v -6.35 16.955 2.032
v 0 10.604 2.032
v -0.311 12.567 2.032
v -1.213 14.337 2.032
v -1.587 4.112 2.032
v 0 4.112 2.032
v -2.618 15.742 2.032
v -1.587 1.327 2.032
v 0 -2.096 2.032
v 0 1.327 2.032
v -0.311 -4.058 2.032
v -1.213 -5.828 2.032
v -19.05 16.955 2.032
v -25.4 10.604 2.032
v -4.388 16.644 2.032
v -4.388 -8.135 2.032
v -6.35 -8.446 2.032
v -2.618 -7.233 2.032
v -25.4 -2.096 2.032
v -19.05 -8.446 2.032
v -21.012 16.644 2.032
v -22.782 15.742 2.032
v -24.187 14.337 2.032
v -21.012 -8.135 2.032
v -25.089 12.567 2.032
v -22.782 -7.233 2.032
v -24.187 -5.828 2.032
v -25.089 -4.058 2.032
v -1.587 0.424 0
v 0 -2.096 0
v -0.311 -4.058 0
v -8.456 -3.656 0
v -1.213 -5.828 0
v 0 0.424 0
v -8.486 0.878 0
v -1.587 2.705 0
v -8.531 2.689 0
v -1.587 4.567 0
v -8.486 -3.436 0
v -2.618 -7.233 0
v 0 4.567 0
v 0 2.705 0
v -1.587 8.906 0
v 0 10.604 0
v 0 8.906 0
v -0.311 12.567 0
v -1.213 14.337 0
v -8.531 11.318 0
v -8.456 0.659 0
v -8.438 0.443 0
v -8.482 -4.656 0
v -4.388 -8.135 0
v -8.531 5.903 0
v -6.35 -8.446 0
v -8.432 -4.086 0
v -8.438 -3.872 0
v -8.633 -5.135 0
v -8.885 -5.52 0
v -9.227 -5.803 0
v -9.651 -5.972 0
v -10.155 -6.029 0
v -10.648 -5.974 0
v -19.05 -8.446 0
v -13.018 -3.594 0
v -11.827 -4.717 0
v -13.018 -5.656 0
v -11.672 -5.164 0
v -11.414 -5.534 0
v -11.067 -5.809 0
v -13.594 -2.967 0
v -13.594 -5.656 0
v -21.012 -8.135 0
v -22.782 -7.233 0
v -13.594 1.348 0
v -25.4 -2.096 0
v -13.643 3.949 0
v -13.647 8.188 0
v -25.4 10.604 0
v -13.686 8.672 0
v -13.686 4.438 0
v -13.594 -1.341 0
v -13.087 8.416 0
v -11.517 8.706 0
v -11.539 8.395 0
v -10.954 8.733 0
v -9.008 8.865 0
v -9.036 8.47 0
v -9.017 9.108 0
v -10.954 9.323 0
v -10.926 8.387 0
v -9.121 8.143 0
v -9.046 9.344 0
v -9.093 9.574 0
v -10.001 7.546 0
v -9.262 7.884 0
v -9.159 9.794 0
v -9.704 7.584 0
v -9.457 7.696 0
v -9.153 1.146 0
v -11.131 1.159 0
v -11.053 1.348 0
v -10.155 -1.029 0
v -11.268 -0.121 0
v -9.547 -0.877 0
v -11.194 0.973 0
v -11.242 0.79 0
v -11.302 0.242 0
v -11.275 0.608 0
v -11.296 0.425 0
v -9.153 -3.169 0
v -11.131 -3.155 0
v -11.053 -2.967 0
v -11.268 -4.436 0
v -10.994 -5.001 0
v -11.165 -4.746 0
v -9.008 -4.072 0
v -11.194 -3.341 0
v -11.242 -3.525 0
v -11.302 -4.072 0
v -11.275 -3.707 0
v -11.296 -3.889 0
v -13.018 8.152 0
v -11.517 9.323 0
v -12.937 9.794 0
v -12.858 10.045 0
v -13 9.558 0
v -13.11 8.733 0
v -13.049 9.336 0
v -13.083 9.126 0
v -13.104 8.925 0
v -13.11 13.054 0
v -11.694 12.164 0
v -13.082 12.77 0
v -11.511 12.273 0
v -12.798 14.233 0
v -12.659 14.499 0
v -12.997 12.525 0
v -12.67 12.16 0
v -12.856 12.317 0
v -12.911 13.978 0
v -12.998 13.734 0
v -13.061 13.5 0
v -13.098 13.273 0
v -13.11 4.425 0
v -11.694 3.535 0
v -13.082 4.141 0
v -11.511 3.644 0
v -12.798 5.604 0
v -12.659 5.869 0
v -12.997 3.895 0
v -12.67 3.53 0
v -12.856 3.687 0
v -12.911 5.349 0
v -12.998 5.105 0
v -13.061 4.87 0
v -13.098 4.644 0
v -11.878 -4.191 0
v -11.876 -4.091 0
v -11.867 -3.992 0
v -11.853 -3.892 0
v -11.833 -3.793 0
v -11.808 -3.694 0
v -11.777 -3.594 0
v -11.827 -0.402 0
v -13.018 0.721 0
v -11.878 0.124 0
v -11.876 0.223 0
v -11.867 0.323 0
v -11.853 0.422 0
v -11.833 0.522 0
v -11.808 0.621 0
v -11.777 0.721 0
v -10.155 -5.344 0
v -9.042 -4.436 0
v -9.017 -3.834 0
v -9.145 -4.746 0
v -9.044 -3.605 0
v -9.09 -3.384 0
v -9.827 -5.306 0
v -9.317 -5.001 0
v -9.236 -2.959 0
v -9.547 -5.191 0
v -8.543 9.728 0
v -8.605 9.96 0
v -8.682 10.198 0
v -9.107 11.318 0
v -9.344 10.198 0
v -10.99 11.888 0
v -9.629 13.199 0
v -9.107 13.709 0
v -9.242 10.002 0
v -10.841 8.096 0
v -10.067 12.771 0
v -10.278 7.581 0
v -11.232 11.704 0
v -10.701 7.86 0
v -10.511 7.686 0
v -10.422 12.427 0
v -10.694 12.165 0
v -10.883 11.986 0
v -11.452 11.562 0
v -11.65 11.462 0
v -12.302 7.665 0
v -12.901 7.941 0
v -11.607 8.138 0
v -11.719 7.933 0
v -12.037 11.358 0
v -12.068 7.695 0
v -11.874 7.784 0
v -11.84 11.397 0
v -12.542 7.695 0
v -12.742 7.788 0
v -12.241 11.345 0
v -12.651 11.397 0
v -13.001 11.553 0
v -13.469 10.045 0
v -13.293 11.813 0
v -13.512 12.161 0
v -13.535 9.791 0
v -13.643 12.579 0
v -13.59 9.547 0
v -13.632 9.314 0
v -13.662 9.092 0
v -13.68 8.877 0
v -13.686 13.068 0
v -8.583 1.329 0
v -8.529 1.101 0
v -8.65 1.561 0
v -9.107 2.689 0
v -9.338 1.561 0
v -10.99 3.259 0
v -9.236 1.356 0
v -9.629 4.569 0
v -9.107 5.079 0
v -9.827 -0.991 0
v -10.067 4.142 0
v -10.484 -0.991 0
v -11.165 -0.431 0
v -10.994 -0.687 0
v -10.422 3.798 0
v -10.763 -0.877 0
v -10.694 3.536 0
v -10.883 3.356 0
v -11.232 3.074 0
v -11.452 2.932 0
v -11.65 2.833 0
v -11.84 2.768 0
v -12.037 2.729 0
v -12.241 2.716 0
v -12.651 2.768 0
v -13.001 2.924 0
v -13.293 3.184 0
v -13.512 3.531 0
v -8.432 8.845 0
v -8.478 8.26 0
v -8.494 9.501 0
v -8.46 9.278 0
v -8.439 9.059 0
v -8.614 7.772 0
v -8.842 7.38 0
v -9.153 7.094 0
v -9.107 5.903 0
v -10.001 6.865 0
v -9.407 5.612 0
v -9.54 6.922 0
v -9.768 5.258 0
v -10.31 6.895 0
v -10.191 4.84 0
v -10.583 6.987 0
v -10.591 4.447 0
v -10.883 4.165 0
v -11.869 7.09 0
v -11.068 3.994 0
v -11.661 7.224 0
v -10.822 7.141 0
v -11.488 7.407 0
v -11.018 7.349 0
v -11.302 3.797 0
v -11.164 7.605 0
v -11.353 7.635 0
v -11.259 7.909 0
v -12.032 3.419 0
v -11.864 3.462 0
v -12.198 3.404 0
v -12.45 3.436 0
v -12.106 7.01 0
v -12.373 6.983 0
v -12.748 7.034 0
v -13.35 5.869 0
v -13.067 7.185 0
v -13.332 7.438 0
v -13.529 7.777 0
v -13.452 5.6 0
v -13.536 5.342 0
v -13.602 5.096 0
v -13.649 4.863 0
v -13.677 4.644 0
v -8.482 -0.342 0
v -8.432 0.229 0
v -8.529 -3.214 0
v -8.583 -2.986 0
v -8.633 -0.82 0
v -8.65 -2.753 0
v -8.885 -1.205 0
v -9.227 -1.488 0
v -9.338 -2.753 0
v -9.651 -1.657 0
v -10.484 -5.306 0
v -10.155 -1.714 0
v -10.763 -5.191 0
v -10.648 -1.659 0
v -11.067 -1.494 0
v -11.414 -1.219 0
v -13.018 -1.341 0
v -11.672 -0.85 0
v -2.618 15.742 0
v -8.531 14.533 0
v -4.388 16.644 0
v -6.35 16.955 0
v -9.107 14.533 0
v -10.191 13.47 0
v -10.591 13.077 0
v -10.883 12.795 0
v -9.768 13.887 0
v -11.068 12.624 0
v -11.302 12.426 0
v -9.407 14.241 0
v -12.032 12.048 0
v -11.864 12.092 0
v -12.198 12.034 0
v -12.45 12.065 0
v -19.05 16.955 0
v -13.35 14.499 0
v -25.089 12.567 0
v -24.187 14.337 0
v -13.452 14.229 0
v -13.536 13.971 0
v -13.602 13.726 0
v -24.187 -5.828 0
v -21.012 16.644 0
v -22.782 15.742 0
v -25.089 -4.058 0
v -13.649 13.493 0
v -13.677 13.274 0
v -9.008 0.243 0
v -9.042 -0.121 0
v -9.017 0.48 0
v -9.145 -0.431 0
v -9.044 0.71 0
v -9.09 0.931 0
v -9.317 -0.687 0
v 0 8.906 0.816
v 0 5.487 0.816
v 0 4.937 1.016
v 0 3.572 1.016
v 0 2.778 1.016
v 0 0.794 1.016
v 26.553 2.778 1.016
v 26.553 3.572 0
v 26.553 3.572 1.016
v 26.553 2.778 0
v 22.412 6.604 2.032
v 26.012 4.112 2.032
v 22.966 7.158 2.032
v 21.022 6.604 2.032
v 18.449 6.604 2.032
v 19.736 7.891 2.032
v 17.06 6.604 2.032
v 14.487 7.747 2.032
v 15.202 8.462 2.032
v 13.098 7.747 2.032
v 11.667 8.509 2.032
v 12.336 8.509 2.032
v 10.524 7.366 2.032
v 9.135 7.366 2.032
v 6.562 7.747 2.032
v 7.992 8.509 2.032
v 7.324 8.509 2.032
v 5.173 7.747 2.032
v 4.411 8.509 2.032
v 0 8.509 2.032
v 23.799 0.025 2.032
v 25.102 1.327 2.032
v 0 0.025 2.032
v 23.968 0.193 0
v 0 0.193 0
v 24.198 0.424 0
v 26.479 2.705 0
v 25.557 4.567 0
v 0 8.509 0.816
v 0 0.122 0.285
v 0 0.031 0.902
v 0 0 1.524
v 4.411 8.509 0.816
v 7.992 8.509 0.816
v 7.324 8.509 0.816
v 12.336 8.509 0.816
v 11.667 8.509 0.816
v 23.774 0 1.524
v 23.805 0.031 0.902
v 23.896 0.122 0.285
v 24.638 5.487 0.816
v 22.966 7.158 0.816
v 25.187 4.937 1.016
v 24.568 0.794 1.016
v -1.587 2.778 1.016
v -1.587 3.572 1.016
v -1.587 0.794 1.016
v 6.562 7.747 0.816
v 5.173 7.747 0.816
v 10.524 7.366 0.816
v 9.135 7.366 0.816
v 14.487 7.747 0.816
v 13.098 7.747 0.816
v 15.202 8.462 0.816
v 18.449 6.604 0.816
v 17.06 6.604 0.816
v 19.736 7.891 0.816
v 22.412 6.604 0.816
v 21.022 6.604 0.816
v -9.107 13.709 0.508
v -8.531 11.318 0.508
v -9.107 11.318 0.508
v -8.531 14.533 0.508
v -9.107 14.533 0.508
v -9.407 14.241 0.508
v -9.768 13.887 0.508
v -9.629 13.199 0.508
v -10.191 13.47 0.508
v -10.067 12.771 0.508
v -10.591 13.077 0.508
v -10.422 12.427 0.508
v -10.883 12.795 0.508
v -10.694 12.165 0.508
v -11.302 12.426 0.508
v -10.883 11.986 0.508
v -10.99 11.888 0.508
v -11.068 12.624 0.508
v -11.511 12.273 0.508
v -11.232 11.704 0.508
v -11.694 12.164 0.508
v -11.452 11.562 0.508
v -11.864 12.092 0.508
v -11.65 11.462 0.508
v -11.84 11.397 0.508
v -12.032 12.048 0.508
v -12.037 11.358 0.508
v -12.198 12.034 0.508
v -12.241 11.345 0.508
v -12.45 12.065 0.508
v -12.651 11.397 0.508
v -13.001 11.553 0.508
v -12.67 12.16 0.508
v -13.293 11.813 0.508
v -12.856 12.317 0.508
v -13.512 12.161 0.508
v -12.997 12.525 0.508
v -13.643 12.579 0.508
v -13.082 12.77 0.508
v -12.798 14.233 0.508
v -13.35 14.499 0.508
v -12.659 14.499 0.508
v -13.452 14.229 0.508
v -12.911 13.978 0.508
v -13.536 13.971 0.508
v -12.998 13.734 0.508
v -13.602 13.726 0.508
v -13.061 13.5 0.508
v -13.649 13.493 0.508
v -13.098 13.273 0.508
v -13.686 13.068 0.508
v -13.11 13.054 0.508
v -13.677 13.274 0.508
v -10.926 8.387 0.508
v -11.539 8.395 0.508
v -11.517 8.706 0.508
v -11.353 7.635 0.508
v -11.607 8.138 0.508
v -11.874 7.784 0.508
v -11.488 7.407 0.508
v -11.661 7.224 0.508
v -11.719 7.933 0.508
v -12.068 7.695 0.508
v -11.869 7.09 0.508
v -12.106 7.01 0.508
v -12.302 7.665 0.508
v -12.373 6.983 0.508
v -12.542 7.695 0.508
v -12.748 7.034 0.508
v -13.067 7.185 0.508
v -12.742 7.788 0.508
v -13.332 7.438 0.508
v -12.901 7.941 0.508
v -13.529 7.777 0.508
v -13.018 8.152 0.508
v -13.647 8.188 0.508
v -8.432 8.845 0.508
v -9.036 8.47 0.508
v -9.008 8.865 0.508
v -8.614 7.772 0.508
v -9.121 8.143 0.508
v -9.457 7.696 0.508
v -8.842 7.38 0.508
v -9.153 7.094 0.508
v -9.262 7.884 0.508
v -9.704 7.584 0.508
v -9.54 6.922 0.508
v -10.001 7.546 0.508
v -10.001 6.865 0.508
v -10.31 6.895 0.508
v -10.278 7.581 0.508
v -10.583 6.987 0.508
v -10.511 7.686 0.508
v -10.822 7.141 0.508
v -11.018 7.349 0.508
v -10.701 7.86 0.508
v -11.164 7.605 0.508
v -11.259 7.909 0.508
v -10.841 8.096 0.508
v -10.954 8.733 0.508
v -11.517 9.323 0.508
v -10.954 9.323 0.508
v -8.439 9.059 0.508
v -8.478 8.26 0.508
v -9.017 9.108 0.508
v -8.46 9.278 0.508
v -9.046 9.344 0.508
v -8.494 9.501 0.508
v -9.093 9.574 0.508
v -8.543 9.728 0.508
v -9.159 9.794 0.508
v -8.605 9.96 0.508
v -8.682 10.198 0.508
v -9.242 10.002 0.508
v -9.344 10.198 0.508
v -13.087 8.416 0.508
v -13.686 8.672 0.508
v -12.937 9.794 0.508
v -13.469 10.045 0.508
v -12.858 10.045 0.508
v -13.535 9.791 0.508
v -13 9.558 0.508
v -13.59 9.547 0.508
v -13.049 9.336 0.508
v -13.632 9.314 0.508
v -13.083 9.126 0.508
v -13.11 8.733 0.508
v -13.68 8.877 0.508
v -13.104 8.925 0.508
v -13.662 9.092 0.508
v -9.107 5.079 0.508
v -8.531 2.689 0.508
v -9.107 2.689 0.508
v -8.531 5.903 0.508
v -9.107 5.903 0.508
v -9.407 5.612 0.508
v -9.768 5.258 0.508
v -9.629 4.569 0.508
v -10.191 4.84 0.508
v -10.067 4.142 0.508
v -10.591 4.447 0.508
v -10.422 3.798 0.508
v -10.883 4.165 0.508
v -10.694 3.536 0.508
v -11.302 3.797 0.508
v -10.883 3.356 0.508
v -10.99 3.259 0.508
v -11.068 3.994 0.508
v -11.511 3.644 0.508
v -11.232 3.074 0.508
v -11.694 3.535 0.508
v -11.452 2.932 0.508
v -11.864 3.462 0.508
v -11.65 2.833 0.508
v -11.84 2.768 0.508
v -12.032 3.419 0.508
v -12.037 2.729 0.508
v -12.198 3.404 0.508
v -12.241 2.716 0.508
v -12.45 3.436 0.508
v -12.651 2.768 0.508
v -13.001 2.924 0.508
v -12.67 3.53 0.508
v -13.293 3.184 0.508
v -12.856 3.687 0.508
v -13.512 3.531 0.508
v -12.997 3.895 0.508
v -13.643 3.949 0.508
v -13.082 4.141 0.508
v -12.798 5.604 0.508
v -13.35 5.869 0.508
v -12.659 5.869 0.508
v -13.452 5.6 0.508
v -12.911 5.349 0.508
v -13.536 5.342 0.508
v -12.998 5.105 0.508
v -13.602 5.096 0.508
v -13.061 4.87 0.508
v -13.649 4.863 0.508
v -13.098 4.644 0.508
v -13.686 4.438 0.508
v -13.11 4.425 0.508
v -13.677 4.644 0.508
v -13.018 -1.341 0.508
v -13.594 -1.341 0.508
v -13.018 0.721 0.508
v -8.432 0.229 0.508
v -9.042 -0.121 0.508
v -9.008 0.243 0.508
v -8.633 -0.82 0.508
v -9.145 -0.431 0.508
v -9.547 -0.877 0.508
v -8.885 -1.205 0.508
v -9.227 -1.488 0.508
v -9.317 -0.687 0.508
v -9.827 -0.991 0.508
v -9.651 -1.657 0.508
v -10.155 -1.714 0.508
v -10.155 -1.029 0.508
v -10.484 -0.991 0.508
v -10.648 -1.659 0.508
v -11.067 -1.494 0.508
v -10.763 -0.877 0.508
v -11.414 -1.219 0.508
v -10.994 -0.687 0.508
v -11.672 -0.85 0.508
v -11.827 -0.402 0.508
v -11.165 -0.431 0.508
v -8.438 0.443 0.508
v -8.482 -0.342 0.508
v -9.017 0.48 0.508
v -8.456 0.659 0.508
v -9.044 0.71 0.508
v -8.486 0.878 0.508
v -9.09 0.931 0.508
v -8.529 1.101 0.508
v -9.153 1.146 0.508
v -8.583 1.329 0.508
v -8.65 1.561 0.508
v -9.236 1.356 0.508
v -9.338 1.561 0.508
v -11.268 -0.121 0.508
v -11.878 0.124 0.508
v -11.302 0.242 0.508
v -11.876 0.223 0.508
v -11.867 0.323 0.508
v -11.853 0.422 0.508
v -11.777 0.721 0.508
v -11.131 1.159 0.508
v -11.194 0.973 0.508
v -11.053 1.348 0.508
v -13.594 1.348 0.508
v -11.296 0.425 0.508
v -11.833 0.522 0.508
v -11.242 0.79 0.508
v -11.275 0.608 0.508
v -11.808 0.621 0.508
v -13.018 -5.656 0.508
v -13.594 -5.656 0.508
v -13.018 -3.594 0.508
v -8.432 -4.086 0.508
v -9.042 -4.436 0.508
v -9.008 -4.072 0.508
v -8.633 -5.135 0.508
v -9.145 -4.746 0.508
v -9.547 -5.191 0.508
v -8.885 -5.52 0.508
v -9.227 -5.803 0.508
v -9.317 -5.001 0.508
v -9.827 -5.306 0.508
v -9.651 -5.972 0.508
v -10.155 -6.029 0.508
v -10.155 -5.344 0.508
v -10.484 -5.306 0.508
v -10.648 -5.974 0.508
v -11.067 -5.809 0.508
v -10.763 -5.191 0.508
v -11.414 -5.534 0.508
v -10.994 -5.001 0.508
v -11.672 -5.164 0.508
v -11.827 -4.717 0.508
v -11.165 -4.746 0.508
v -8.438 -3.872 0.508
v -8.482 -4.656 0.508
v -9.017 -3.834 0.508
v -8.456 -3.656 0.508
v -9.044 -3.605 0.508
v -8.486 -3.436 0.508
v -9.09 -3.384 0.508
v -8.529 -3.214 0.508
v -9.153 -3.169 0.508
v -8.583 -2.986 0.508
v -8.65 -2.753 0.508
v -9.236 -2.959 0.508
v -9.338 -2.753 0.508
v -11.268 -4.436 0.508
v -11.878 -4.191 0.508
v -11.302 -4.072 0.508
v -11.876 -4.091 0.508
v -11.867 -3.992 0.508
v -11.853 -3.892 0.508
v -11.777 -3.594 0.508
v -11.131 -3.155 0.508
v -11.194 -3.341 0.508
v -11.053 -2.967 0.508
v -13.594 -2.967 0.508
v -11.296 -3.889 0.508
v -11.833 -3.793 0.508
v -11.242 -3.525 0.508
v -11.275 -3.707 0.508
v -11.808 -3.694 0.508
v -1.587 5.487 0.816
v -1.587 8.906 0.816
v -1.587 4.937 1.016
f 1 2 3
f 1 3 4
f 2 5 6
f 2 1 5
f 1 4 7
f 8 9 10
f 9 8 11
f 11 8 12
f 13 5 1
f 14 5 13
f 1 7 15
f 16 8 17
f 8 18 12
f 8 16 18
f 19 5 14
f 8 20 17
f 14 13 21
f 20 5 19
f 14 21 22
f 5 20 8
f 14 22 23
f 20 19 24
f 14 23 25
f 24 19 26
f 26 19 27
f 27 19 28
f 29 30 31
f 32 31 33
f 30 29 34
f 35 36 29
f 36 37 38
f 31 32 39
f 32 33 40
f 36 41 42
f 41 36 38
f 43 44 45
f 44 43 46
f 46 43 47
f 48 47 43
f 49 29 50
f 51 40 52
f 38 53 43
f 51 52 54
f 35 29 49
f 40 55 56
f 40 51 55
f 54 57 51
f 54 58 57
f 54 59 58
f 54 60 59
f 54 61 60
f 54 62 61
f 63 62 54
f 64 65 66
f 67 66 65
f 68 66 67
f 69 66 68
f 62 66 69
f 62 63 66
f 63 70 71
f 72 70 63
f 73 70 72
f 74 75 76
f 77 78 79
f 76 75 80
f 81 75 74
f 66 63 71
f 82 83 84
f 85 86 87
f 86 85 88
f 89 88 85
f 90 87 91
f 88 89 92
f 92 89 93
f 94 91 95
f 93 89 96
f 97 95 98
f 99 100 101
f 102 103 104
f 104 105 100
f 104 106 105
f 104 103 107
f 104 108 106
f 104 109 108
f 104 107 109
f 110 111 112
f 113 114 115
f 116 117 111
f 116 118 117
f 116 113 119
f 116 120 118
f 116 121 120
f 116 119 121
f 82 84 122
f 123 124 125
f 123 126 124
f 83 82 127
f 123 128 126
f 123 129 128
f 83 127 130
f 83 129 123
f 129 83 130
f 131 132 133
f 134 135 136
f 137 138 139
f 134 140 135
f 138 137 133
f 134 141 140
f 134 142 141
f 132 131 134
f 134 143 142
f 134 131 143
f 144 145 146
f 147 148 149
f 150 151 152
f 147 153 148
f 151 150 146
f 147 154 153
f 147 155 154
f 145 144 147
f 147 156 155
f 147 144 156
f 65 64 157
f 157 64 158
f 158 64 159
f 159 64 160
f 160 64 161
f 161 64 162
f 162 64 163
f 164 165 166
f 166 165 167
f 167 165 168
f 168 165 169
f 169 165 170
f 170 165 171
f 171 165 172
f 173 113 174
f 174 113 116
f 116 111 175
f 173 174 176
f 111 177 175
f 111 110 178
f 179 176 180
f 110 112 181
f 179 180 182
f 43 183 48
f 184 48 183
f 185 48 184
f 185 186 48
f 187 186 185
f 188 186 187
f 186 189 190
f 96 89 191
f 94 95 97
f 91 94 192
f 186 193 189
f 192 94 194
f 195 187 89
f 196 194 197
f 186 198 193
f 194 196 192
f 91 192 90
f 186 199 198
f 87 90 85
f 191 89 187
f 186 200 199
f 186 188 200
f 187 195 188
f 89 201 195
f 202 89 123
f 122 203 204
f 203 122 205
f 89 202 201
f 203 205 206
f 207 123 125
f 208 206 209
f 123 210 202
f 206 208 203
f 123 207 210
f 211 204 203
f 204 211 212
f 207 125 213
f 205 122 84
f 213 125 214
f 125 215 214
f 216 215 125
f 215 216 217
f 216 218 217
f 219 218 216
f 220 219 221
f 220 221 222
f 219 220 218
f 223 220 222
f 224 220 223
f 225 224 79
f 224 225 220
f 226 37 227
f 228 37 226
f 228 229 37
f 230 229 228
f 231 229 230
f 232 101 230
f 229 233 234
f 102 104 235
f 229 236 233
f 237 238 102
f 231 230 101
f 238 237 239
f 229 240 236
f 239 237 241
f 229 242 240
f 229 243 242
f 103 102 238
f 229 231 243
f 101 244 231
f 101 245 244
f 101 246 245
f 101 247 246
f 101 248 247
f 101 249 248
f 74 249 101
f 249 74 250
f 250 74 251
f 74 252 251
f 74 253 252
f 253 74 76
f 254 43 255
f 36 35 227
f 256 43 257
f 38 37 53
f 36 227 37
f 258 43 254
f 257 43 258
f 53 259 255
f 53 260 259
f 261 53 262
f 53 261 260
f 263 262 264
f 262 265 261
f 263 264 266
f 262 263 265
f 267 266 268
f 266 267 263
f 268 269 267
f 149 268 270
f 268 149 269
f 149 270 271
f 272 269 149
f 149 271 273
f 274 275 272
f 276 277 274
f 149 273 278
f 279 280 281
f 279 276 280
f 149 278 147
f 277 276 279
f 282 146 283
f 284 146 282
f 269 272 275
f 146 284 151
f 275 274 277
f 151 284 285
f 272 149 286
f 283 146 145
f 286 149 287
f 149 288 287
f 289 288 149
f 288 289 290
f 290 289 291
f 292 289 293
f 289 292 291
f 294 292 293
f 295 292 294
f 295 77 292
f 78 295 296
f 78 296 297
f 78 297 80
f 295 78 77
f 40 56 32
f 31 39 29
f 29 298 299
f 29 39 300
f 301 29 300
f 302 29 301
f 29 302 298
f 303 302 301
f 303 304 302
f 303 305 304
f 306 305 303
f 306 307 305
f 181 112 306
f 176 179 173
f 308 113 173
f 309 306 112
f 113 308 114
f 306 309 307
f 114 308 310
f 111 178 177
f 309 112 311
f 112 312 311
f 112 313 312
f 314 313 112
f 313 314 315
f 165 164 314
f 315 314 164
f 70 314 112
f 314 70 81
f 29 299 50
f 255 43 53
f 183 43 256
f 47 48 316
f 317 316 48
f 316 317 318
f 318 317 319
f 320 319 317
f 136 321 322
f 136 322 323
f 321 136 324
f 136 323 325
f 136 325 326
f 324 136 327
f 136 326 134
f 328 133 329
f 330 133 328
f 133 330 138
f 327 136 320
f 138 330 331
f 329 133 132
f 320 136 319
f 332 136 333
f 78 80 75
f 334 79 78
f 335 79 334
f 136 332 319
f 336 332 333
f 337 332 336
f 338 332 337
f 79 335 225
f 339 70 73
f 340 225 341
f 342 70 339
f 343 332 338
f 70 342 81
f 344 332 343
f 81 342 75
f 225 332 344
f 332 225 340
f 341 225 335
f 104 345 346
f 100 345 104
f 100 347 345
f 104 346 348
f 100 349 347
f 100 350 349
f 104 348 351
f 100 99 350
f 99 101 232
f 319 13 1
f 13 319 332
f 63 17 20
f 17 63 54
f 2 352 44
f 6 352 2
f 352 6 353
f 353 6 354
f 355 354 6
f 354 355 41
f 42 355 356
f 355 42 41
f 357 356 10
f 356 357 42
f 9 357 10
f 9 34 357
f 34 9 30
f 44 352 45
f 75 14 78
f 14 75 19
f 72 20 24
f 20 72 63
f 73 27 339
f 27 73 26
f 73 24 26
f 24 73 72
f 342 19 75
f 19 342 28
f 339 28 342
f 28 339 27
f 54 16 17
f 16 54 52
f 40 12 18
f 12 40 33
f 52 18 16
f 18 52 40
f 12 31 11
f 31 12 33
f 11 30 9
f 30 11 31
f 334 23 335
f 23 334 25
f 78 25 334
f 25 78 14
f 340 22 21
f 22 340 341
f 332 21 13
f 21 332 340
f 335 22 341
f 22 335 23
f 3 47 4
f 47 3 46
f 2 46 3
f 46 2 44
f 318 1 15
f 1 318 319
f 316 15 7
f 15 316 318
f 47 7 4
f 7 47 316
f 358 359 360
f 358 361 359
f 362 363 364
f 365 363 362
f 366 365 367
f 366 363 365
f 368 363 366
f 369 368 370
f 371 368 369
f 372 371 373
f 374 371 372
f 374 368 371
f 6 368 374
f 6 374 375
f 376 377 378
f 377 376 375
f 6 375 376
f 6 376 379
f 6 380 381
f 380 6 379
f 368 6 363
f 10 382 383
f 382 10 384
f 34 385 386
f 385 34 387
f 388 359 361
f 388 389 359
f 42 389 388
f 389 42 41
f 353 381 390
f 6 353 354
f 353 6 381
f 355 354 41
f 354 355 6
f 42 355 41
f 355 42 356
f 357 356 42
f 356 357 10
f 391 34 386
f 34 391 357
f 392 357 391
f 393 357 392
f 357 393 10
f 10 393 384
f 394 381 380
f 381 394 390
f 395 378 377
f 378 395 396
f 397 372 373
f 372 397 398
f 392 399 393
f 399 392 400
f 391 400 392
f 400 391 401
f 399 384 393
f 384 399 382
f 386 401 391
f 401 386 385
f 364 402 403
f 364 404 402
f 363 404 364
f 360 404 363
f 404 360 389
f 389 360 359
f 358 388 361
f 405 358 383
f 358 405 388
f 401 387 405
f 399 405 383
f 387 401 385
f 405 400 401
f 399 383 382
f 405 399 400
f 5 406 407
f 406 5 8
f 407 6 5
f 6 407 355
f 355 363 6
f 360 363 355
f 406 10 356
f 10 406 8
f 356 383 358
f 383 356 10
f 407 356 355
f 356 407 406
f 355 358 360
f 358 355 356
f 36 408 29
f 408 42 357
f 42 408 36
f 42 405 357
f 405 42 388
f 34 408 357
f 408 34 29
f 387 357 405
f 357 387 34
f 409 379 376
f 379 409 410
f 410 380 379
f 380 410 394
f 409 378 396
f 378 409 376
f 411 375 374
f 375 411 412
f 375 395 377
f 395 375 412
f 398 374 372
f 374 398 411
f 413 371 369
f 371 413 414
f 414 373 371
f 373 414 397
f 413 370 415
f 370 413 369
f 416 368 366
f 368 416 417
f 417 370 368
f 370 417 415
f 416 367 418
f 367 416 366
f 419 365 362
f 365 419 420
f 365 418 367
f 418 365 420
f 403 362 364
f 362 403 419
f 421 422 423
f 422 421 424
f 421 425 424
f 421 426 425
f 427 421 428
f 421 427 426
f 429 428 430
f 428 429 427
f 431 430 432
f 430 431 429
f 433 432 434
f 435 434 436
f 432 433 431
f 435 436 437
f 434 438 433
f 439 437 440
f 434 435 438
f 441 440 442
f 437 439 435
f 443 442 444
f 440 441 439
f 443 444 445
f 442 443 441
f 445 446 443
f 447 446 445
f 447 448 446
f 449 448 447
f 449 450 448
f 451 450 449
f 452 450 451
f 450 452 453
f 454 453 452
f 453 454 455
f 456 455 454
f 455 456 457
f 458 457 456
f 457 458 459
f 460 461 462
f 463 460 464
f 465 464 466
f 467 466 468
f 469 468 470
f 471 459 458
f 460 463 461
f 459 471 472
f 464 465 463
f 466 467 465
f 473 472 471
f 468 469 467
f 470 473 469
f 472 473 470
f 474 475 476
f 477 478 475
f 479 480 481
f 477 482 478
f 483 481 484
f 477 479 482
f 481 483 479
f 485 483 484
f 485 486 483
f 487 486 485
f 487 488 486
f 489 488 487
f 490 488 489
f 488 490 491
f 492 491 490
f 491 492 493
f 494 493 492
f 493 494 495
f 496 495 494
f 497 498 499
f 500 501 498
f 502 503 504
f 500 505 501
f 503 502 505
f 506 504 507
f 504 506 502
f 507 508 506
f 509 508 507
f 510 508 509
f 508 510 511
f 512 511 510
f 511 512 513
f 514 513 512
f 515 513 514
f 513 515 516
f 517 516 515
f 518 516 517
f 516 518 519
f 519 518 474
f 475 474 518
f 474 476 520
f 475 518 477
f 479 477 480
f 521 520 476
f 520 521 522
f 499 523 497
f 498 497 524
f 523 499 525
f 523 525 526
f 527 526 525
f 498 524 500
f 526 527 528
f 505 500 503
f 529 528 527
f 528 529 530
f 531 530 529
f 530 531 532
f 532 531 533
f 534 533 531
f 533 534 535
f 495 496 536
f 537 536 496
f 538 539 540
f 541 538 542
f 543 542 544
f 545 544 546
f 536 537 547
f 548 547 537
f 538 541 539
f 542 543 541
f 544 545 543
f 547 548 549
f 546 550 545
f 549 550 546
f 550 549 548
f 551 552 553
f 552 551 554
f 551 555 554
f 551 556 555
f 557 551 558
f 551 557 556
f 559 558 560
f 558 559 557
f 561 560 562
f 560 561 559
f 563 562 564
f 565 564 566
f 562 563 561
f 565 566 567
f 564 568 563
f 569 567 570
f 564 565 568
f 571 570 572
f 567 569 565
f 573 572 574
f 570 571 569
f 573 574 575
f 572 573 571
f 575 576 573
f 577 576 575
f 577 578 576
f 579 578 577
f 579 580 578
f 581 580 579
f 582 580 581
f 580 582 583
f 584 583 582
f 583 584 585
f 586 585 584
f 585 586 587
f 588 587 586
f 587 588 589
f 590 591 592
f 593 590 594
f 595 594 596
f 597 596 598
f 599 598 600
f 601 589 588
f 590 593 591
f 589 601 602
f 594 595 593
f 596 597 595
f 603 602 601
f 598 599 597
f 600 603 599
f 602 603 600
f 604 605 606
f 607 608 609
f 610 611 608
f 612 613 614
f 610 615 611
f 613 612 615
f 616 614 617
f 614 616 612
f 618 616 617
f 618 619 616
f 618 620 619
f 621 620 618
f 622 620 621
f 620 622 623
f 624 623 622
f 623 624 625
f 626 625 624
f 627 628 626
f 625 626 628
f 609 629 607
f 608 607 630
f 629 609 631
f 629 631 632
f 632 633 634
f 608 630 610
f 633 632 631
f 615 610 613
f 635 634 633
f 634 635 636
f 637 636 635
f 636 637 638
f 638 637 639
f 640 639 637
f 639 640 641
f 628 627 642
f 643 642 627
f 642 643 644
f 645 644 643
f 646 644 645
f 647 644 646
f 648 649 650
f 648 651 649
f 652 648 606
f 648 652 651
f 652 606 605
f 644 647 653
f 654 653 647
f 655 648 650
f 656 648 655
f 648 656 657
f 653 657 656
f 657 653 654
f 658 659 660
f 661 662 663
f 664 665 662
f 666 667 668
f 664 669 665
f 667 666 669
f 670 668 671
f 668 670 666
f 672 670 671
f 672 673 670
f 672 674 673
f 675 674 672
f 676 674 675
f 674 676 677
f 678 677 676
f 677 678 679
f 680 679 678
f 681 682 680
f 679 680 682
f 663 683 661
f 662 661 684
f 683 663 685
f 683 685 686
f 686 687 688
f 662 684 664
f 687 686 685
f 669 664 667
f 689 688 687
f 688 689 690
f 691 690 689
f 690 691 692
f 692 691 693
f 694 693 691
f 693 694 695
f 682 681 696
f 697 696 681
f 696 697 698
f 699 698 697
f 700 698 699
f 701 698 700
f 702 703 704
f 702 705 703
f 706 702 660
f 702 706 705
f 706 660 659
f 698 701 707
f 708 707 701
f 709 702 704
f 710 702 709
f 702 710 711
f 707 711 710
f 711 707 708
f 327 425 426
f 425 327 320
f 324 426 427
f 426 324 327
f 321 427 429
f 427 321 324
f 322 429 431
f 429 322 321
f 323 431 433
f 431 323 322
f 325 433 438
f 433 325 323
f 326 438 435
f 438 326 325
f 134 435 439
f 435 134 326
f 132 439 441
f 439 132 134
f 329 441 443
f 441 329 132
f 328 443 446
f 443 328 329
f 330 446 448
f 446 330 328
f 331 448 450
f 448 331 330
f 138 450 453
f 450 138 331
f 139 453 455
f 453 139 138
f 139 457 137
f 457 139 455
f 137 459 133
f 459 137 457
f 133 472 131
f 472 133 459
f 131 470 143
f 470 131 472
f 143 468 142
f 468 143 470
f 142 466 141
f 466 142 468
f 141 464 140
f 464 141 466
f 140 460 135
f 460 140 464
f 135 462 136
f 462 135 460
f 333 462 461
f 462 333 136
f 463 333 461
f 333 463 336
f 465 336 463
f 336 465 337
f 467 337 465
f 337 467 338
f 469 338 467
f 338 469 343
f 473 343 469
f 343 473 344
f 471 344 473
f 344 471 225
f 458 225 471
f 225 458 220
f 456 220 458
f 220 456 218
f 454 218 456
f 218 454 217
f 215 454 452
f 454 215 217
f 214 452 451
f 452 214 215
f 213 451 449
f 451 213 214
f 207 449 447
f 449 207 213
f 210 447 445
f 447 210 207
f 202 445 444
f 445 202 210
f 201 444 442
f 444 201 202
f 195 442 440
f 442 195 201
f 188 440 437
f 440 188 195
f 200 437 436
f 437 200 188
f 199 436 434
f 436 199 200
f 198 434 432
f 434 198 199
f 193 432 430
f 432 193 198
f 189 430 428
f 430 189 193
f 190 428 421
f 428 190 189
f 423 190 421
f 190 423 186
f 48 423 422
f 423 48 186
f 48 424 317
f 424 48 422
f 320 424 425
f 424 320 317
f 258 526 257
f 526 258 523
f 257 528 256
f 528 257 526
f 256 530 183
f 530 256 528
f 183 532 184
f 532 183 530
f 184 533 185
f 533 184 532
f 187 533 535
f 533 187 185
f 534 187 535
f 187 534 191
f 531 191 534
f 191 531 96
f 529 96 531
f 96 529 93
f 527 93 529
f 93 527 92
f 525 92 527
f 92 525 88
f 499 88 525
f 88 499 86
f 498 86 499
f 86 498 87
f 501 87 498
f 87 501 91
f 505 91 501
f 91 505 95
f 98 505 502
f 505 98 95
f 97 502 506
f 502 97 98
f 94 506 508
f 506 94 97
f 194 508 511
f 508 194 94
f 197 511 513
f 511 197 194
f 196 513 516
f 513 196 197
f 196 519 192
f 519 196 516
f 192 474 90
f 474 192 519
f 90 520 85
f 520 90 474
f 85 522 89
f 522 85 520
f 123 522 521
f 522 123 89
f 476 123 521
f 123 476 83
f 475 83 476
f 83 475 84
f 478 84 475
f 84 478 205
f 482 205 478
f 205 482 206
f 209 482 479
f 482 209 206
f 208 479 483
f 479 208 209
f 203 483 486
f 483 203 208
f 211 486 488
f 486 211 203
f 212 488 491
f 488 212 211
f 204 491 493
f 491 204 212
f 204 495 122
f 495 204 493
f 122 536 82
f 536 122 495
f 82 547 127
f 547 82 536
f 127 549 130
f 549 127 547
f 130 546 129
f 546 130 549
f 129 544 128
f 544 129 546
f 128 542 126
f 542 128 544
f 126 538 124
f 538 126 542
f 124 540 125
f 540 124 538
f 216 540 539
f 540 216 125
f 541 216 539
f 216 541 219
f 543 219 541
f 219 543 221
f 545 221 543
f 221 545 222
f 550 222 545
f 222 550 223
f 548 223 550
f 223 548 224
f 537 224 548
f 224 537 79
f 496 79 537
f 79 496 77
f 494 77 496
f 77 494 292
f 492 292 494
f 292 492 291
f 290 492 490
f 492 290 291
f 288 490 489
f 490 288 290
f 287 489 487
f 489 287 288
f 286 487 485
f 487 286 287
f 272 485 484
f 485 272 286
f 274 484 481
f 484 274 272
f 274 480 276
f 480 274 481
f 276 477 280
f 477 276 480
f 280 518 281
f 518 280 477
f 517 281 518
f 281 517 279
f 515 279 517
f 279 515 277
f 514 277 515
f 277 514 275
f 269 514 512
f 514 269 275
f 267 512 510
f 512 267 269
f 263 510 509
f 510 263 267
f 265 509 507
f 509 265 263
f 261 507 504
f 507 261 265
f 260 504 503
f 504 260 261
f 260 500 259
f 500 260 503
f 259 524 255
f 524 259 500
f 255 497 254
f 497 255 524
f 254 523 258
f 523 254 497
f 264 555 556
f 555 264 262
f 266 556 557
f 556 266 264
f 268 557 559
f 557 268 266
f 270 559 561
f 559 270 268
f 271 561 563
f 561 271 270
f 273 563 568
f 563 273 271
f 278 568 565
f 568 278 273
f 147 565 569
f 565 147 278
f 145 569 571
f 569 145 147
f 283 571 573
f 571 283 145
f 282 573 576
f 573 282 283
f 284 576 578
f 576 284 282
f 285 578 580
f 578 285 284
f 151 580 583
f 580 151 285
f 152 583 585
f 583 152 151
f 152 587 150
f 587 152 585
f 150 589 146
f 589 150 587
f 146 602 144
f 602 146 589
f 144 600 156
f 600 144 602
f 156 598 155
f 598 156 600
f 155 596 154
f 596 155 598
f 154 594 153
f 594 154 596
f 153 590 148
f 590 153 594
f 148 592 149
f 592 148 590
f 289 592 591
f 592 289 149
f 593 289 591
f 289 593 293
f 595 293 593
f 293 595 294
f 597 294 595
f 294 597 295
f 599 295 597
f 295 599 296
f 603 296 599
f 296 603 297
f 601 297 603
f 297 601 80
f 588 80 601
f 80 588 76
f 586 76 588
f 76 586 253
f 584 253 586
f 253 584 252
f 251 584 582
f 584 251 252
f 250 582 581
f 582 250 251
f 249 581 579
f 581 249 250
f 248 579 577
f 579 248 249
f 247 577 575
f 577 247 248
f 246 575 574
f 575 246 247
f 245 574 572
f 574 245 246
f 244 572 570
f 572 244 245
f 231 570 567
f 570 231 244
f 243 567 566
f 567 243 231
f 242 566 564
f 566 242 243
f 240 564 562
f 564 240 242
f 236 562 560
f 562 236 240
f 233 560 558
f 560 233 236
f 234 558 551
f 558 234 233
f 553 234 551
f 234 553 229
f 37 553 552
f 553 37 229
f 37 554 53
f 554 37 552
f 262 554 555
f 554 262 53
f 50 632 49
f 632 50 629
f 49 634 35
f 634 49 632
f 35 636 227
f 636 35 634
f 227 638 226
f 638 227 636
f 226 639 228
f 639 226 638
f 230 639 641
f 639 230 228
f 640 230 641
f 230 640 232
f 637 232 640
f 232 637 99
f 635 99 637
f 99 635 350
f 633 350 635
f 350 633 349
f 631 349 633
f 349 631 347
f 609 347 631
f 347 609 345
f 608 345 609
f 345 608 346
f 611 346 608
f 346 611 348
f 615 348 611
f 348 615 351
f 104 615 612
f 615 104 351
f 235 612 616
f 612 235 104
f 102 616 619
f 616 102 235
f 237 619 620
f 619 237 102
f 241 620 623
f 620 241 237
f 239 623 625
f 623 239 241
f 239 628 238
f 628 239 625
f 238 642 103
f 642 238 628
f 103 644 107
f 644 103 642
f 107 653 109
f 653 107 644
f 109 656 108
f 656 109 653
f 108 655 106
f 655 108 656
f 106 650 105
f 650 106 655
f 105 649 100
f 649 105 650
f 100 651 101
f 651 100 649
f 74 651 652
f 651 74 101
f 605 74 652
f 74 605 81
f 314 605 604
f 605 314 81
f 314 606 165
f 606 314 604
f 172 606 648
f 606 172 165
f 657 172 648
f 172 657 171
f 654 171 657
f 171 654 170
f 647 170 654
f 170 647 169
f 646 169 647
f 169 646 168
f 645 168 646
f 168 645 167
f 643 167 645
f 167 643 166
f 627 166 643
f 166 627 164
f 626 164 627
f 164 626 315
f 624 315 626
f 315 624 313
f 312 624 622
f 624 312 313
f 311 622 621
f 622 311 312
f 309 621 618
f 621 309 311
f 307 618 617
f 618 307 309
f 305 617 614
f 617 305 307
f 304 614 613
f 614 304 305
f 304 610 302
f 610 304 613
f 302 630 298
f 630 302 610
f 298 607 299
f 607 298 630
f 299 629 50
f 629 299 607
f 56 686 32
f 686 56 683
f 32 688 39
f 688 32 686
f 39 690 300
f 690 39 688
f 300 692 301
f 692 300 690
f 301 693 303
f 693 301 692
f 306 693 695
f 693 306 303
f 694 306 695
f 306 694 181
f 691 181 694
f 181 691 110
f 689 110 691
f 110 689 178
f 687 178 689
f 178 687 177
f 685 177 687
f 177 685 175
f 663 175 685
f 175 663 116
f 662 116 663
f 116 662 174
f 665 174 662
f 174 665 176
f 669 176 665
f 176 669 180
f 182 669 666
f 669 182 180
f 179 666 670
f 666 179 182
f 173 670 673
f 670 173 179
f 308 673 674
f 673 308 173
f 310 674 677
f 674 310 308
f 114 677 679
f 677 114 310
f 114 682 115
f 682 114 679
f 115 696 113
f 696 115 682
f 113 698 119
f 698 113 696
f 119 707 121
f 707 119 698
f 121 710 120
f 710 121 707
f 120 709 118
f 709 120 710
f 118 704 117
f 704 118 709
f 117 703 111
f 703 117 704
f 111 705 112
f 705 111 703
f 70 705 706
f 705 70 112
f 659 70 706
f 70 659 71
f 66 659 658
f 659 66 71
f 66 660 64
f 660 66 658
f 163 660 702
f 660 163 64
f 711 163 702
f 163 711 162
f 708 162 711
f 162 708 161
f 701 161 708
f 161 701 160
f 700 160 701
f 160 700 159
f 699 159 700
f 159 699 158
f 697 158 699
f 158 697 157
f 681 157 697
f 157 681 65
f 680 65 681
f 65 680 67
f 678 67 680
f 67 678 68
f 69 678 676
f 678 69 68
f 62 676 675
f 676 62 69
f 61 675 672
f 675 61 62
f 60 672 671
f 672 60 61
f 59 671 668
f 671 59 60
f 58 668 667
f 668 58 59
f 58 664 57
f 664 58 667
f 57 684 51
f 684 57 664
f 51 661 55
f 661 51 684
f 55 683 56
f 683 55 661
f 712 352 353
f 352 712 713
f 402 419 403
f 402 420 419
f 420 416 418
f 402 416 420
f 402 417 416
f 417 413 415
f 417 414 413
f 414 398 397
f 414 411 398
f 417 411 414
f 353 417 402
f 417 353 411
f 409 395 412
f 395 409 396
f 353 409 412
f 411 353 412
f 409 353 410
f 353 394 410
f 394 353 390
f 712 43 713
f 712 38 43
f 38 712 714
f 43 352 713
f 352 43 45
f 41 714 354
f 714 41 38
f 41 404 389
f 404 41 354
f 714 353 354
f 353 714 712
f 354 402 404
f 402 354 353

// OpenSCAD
//(this is just a reference table to help pick cuts below)
//0 = .335",1:1 = .320",2:2 = .305",3:3 = .290",4:4 = .275",5:5 = .260",6:6 = .245",7:7 = .230",8:8 = .215",9:9 = .200"]

//cuts are ordered teh same as Schlage key codes
//(cut at the handle of key)
cut_1 = 2; 
cut_2 = 3;
cut_3 = 2; 
cut_4 = 5; 
cut_5 = 5; 
//(cut at the tip of key)

//Print label
keycode=1; 

function mm(i) = i*25.4;

module handle(size, r) {
  union() {
    translate([r, 0, 0]) cube([size[0]-2*r, size[1], size[2]]);
    translate([0, r, 0]) cube([size[0], size[1]-2*r, size[2]]);
    translate([r, r, 0]) cylinder(h=size[2], r=r);
    translate([size[0]-r, r, 0]) cylinder(h=size[2], r=r);
    translate([r, size[1]-r, 0]) cylinder(h=size[2], r=r);
    translate([size[0]-r, size[1]-r, 0]) cylinder(h=size[2], r=r);
  }
}

module bit() {
  w = mm(1/4);
  difference() {
    translate([-w/2, 0, 0]) cube([w, mm(1), w]);
    translate([-mm(7/256), 0, 0]) rotate([0, 0, 135]) cube([w, w, w]);
    translate([mm(7/256), 0, 0]) rotate([0, 0, -45]) cube([w, w, w]);
  }
}

// Schlage SC1 5 pin key.
module sc1(bits) {
  thickness = mm(0.080);
  width = mm(.335);
  shoulder = mm(.231);
  pin_spacing = mm(.156);
  depth_inc = mm(.015);
  tiplength = mm(.05);
  //length = mm(17/16);
  length = shoulder + 5 * pin_spacing + tiplength;

  
  // Handle size
  h_l = mm(1);
  h_w = mm(1);
  h_d = mm(1/16);
  difference() {
    // blade and key handle
    union() {
      translate([-h_l, -h_w/2 + width/2, 0]) handle([h_l, h_w, thickness], mm(1/4));
      intersection() {
        // cut a little off the tip to avoid going too long
        cube([length - mm(1/64), width, thickness]);
        translate([0, mm(1/4), thickness*3/4]) rotate([0, 90, 0]) cylinder(h=length, r=mm(1/4), $fn=64);
      }
    }
    
    // chamfer the tip
    translate([length, mm(1/8), 0]) {
      rotate([0, 0, 45]) cube([10, 10, thickness]);
      rotate([0, 0, 225]) cube([10, 10, thickness]);
    }
 
    // Keycode
    if (keycode==1){
        translate([-11,width/2, mm(-0.060)]) {
            linear_extrude(height=mm(0.080)) rotate([0,0,90]) scale([-1, 1, 1]) text(str(cut_1, cut_2, cut_3, cut_4, cut_5), font="Calibri-Bold", direction="ltr", halign="center", valign="center", size=5);
            }
    }  


    // cut the channels in the key.
    union() {
      translate([-h_d, mm(9/64), thickness/2]) rotate([62, 0, 0]) cube([length + h_d, width, width]);
      translate([-h_d, mm(7/64), thickness/2]) rotate([55, 0, 0]) cube([length + h_d, width, width]);
      translate([-h_d, mm(7/64), thickness/2]) cube([length + h_d, mm(1/32), width]);
    }
    
    translate([-h_d, width - mm(9/64), -0.2]) cube([length + h_d, width - (width - mm(10/64)), thickness/2]);
    translate([-h_d, width - mm(9/64), thickness/2]) rotate([-110, 0, 0]) cube([length + h_d, width, thickness/2]);
    
    intersection() {
      translate([-h_d, mm(1/32), thickness/2]) rotate([-118, 0, 0]) cube([length + h_d, width, width]);
      translate([-h_d, mm(1/32), thickness/2]) rotate([-110, 0, 0]) cube([length + h_d, width, width]);
    }
    
    // Do the actual bitting
    for (b = [0:4]) {
      translate([shoulder + b*pin_spacing, width - bits[b]*depth_inc, 0]) bit();
    }
  }
}
//Create the key
sc1([cut_1,cut_2,cut_3,cut_4,cut_5]);
